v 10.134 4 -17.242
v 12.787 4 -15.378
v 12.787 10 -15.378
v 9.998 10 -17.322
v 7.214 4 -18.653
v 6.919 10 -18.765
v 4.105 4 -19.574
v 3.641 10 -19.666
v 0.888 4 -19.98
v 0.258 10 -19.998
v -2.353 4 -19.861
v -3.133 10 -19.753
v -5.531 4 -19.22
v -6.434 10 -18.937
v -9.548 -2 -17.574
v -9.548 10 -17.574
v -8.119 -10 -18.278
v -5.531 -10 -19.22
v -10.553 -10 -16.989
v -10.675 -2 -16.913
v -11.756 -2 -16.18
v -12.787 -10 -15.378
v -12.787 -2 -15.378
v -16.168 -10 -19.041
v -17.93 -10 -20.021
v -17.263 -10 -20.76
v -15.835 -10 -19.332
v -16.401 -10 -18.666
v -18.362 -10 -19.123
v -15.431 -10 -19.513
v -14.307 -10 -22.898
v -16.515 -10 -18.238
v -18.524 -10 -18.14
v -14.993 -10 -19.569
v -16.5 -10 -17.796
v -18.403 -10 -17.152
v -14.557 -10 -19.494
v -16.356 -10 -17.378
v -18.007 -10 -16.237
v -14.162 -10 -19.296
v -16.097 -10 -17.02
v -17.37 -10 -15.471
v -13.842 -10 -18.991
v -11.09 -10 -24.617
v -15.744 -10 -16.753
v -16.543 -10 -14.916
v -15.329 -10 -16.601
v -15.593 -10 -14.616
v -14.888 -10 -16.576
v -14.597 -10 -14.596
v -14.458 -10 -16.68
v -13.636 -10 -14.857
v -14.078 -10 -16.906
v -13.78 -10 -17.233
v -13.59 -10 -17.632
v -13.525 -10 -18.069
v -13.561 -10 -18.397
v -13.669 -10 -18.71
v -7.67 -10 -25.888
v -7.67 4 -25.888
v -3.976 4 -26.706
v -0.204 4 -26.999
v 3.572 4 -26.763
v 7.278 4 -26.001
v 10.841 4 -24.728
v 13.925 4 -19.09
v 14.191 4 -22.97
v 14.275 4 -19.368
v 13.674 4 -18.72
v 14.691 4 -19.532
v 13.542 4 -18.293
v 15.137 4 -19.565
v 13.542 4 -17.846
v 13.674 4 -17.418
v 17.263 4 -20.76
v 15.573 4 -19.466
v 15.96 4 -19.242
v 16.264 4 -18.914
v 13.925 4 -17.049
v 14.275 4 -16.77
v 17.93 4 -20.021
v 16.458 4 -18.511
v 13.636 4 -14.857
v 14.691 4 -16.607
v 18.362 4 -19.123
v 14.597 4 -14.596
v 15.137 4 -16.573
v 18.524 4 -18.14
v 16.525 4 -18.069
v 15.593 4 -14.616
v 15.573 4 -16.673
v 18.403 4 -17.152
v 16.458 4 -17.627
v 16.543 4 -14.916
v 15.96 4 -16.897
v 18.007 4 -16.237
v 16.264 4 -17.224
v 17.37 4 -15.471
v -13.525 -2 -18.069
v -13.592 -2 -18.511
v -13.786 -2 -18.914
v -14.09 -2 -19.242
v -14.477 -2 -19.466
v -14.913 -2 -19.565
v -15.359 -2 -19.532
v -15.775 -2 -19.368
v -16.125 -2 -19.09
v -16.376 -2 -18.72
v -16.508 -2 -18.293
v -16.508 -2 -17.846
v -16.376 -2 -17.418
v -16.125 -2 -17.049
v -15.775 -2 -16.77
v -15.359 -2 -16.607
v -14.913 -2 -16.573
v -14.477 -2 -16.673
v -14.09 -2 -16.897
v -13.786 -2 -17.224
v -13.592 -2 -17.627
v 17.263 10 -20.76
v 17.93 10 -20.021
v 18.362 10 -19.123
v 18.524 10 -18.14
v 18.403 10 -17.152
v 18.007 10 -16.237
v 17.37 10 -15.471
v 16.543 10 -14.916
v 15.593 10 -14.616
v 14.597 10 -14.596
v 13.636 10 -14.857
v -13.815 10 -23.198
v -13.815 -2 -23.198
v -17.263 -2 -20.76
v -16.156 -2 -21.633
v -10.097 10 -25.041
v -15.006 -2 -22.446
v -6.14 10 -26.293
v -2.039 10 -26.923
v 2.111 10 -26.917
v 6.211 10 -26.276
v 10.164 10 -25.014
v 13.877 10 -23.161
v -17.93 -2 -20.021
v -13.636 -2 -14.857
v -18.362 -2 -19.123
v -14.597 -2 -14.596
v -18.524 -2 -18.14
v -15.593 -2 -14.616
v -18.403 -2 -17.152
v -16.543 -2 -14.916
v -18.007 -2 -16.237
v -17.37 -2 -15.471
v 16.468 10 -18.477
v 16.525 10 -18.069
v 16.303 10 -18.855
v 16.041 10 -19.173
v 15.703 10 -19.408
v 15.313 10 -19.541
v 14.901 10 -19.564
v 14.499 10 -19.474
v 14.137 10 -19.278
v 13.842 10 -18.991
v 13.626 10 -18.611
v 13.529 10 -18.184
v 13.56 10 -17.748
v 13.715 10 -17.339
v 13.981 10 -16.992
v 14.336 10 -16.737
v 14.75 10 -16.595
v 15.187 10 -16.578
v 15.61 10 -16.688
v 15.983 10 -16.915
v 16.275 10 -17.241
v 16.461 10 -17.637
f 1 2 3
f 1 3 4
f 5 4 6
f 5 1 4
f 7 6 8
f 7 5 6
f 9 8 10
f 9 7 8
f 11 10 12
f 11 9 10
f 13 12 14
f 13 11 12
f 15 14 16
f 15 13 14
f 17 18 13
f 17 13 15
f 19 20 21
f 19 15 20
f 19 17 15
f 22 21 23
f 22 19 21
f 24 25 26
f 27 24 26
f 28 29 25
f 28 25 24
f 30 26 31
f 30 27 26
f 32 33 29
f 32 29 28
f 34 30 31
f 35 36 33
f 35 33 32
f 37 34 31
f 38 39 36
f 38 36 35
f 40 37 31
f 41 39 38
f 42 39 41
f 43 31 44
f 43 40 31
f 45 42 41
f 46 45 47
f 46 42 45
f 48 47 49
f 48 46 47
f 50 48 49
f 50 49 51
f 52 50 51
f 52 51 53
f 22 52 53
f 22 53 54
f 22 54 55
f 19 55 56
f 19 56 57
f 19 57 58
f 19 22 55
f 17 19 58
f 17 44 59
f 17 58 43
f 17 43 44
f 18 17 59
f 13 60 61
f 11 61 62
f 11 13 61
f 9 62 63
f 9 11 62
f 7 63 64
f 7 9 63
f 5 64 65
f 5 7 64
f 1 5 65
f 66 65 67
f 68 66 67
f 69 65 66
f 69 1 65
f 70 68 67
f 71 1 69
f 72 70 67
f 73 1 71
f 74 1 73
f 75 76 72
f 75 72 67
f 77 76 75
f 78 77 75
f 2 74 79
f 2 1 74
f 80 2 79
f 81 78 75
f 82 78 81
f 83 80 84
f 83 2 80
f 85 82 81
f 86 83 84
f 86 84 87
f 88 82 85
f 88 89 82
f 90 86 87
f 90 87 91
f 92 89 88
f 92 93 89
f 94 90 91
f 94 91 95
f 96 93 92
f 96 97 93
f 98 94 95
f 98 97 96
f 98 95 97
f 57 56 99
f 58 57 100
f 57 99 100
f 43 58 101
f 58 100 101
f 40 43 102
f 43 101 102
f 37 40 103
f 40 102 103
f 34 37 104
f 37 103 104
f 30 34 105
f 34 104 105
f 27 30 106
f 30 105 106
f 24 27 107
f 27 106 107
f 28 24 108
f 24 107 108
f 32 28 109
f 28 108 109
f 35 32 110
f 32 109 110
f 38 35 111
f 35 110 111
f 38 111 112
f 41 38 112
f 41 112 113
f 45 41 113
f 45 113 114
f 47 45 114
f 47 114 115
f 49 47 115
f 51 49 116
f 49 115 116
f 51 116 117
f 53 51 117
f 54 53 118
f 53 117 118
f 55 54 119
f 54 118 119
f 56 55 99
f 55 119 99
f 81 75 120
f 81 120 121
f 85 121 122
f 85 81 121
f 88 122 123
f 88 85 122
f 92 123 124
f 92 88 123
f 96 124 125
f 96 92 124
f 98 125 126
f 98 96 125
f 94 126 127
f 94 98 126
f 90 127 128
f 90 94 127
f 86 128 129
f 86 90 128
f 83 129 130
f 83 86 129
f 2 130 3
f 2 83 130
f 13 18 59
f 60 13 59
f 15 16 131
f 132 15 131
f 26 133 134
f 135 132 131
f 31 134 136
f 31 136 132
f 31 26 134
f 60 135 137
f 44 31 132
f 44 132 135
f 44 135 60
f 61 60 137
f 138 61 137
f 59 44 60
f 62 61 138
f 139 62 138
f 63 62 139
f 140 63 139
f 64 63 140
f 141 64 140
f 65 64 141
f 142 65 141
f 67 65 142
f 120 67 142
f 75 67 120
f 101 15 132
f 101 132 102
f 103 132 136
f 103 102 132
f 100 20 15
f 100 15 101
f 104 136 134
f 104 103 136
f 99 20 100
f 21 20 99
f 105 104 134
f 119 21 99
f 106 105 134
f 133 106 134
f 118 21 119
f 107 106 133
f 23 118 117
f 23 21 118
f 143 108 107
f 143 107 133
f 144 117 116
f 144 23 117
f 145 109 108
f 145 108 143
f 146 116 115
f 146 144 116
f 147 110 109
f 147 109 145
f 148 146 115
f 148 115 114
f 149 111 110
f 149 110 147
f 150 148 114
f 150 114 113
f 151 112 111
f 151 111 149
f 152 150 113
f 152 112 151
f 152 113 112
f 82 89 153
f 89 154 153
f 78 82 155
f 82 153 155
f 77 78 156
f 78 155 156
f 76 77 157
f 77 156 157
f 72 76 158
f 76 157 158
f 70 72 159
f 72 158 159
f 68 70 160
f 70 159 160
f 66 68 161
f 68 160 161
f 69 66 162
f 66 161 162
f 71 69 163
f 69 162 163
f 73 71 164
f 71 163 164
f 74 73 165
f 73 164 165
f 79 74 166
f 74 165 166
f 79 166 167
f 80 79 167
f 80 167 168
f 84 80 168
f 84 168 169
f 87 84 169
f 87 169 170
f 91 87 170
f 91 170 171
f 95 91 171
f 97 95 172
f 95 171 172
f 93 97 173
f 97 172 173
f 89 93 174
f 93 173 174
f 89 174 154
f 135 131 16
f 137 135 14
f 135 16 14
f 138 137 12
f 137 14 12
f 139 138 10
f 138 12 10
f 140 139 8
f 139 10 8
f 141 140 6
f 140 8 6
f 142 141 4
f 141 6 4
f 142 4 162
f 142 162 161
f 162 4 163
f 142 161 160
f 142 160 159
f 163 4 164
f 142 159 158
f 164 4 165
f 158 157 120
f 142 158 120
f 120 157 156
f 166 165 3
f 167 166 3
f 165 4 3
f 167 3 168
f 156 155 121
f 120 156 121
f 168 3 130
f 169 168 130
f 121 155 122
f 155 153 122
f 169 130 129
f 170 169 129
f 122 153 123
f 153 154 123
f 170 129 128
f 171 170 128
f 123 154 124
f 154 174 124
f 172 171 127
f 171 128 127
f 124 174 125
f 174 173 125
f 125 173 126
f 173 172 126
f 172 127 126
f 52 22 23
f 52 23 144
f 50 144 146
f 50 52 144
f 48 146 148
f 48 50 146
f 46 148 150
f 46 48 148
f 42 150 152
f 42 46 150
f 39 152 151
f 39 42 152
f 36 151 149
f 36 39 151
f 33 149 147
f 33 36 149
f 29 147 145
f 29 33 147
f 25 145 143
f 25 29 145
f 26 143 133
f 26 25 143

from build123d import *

# Parameters (mm, degrees)
F1_DEPTH = 10
F3_DEPTH = 14
F5_DEPTH = 12


with BuildPart() as f1:
    # F0 (on Front) → F1 (new body, symmetric)
    with BuildSketch(Plane.XZ):
        with BuildLine():
            ThreePointArc((12.7872340426, -15.3781223022), (0, -20), (-12.7872340426, -15.3781223022))
            ThreePointArc((-12.7872340426, -15.3781223022), (-17.7161714029, -15.8315277476), (-17.2627659574, -20.760465108))
            ThreePointArc((-17.2627659574, -20.760465108), (0, -27), (17.2627659574, -20.760465108))
            ThreePointArc((17.2627659574, -20.760465108), (17.7161714029, -15.8315277476), (12.7872340426, -15.3781223022))
        make_face()
        with BuildLine():
            ThreePointArc((-13.525, -18.0692937051), (-13.6063617319, -18.556597988), (-13.8416206189, -18.9910383771))
            ThreePointArc((-13.8416206189, -18.9910383771), (-16.4436382681, -17.5819894221), (-13.525, -18.0692937051))
        make_face(mode=Mode.SUBTRACT)
        with BuildLine():
            ThreePointArc((16.525, -18.0692937051), (15.512304283, -19.4879319732), (13.8416206189, -18.9910383771))
            ThreePointArc((13.8416206189, -18.9910383771), (14.537695717, -16.6506554369), (16.525, -18.0692937051))
        make_face(mode=Mode.SUBTRACT)
    extrude(amount=F1_DEPTH, both=True)

    # F2 (on face) → F3 (cut)
    with BuildSketch(Plane.XZ.offset(10)):
        Polygon((-2.3909412976, -9.4292996609), (-9.1462977059, -30.4901171085), (24.7288569808, -31.99012205), (30.0422031432, -11.7994137108), align=None)
    extrude(amount=-F3_DEPTH, mode=Mode.SUBTRACT)

    # F4 (on face) → F5 (cut)
    with BuildSketch(Plane(origin=(0, 10, 0), x_dir=(-1, 0, 0), z_dir=(0, 1, 0))):
        Polygon((13.4975397959, -6.4067570493), (6.4347200096, -13.4695768356), (17.8041364998, -28.4565351903), (37.6144833863, -8.6461873725), align=None)
    extrude(amount=-F5_DEPTH, mode=Mode.SUBTRACT)


solid = f1.part
